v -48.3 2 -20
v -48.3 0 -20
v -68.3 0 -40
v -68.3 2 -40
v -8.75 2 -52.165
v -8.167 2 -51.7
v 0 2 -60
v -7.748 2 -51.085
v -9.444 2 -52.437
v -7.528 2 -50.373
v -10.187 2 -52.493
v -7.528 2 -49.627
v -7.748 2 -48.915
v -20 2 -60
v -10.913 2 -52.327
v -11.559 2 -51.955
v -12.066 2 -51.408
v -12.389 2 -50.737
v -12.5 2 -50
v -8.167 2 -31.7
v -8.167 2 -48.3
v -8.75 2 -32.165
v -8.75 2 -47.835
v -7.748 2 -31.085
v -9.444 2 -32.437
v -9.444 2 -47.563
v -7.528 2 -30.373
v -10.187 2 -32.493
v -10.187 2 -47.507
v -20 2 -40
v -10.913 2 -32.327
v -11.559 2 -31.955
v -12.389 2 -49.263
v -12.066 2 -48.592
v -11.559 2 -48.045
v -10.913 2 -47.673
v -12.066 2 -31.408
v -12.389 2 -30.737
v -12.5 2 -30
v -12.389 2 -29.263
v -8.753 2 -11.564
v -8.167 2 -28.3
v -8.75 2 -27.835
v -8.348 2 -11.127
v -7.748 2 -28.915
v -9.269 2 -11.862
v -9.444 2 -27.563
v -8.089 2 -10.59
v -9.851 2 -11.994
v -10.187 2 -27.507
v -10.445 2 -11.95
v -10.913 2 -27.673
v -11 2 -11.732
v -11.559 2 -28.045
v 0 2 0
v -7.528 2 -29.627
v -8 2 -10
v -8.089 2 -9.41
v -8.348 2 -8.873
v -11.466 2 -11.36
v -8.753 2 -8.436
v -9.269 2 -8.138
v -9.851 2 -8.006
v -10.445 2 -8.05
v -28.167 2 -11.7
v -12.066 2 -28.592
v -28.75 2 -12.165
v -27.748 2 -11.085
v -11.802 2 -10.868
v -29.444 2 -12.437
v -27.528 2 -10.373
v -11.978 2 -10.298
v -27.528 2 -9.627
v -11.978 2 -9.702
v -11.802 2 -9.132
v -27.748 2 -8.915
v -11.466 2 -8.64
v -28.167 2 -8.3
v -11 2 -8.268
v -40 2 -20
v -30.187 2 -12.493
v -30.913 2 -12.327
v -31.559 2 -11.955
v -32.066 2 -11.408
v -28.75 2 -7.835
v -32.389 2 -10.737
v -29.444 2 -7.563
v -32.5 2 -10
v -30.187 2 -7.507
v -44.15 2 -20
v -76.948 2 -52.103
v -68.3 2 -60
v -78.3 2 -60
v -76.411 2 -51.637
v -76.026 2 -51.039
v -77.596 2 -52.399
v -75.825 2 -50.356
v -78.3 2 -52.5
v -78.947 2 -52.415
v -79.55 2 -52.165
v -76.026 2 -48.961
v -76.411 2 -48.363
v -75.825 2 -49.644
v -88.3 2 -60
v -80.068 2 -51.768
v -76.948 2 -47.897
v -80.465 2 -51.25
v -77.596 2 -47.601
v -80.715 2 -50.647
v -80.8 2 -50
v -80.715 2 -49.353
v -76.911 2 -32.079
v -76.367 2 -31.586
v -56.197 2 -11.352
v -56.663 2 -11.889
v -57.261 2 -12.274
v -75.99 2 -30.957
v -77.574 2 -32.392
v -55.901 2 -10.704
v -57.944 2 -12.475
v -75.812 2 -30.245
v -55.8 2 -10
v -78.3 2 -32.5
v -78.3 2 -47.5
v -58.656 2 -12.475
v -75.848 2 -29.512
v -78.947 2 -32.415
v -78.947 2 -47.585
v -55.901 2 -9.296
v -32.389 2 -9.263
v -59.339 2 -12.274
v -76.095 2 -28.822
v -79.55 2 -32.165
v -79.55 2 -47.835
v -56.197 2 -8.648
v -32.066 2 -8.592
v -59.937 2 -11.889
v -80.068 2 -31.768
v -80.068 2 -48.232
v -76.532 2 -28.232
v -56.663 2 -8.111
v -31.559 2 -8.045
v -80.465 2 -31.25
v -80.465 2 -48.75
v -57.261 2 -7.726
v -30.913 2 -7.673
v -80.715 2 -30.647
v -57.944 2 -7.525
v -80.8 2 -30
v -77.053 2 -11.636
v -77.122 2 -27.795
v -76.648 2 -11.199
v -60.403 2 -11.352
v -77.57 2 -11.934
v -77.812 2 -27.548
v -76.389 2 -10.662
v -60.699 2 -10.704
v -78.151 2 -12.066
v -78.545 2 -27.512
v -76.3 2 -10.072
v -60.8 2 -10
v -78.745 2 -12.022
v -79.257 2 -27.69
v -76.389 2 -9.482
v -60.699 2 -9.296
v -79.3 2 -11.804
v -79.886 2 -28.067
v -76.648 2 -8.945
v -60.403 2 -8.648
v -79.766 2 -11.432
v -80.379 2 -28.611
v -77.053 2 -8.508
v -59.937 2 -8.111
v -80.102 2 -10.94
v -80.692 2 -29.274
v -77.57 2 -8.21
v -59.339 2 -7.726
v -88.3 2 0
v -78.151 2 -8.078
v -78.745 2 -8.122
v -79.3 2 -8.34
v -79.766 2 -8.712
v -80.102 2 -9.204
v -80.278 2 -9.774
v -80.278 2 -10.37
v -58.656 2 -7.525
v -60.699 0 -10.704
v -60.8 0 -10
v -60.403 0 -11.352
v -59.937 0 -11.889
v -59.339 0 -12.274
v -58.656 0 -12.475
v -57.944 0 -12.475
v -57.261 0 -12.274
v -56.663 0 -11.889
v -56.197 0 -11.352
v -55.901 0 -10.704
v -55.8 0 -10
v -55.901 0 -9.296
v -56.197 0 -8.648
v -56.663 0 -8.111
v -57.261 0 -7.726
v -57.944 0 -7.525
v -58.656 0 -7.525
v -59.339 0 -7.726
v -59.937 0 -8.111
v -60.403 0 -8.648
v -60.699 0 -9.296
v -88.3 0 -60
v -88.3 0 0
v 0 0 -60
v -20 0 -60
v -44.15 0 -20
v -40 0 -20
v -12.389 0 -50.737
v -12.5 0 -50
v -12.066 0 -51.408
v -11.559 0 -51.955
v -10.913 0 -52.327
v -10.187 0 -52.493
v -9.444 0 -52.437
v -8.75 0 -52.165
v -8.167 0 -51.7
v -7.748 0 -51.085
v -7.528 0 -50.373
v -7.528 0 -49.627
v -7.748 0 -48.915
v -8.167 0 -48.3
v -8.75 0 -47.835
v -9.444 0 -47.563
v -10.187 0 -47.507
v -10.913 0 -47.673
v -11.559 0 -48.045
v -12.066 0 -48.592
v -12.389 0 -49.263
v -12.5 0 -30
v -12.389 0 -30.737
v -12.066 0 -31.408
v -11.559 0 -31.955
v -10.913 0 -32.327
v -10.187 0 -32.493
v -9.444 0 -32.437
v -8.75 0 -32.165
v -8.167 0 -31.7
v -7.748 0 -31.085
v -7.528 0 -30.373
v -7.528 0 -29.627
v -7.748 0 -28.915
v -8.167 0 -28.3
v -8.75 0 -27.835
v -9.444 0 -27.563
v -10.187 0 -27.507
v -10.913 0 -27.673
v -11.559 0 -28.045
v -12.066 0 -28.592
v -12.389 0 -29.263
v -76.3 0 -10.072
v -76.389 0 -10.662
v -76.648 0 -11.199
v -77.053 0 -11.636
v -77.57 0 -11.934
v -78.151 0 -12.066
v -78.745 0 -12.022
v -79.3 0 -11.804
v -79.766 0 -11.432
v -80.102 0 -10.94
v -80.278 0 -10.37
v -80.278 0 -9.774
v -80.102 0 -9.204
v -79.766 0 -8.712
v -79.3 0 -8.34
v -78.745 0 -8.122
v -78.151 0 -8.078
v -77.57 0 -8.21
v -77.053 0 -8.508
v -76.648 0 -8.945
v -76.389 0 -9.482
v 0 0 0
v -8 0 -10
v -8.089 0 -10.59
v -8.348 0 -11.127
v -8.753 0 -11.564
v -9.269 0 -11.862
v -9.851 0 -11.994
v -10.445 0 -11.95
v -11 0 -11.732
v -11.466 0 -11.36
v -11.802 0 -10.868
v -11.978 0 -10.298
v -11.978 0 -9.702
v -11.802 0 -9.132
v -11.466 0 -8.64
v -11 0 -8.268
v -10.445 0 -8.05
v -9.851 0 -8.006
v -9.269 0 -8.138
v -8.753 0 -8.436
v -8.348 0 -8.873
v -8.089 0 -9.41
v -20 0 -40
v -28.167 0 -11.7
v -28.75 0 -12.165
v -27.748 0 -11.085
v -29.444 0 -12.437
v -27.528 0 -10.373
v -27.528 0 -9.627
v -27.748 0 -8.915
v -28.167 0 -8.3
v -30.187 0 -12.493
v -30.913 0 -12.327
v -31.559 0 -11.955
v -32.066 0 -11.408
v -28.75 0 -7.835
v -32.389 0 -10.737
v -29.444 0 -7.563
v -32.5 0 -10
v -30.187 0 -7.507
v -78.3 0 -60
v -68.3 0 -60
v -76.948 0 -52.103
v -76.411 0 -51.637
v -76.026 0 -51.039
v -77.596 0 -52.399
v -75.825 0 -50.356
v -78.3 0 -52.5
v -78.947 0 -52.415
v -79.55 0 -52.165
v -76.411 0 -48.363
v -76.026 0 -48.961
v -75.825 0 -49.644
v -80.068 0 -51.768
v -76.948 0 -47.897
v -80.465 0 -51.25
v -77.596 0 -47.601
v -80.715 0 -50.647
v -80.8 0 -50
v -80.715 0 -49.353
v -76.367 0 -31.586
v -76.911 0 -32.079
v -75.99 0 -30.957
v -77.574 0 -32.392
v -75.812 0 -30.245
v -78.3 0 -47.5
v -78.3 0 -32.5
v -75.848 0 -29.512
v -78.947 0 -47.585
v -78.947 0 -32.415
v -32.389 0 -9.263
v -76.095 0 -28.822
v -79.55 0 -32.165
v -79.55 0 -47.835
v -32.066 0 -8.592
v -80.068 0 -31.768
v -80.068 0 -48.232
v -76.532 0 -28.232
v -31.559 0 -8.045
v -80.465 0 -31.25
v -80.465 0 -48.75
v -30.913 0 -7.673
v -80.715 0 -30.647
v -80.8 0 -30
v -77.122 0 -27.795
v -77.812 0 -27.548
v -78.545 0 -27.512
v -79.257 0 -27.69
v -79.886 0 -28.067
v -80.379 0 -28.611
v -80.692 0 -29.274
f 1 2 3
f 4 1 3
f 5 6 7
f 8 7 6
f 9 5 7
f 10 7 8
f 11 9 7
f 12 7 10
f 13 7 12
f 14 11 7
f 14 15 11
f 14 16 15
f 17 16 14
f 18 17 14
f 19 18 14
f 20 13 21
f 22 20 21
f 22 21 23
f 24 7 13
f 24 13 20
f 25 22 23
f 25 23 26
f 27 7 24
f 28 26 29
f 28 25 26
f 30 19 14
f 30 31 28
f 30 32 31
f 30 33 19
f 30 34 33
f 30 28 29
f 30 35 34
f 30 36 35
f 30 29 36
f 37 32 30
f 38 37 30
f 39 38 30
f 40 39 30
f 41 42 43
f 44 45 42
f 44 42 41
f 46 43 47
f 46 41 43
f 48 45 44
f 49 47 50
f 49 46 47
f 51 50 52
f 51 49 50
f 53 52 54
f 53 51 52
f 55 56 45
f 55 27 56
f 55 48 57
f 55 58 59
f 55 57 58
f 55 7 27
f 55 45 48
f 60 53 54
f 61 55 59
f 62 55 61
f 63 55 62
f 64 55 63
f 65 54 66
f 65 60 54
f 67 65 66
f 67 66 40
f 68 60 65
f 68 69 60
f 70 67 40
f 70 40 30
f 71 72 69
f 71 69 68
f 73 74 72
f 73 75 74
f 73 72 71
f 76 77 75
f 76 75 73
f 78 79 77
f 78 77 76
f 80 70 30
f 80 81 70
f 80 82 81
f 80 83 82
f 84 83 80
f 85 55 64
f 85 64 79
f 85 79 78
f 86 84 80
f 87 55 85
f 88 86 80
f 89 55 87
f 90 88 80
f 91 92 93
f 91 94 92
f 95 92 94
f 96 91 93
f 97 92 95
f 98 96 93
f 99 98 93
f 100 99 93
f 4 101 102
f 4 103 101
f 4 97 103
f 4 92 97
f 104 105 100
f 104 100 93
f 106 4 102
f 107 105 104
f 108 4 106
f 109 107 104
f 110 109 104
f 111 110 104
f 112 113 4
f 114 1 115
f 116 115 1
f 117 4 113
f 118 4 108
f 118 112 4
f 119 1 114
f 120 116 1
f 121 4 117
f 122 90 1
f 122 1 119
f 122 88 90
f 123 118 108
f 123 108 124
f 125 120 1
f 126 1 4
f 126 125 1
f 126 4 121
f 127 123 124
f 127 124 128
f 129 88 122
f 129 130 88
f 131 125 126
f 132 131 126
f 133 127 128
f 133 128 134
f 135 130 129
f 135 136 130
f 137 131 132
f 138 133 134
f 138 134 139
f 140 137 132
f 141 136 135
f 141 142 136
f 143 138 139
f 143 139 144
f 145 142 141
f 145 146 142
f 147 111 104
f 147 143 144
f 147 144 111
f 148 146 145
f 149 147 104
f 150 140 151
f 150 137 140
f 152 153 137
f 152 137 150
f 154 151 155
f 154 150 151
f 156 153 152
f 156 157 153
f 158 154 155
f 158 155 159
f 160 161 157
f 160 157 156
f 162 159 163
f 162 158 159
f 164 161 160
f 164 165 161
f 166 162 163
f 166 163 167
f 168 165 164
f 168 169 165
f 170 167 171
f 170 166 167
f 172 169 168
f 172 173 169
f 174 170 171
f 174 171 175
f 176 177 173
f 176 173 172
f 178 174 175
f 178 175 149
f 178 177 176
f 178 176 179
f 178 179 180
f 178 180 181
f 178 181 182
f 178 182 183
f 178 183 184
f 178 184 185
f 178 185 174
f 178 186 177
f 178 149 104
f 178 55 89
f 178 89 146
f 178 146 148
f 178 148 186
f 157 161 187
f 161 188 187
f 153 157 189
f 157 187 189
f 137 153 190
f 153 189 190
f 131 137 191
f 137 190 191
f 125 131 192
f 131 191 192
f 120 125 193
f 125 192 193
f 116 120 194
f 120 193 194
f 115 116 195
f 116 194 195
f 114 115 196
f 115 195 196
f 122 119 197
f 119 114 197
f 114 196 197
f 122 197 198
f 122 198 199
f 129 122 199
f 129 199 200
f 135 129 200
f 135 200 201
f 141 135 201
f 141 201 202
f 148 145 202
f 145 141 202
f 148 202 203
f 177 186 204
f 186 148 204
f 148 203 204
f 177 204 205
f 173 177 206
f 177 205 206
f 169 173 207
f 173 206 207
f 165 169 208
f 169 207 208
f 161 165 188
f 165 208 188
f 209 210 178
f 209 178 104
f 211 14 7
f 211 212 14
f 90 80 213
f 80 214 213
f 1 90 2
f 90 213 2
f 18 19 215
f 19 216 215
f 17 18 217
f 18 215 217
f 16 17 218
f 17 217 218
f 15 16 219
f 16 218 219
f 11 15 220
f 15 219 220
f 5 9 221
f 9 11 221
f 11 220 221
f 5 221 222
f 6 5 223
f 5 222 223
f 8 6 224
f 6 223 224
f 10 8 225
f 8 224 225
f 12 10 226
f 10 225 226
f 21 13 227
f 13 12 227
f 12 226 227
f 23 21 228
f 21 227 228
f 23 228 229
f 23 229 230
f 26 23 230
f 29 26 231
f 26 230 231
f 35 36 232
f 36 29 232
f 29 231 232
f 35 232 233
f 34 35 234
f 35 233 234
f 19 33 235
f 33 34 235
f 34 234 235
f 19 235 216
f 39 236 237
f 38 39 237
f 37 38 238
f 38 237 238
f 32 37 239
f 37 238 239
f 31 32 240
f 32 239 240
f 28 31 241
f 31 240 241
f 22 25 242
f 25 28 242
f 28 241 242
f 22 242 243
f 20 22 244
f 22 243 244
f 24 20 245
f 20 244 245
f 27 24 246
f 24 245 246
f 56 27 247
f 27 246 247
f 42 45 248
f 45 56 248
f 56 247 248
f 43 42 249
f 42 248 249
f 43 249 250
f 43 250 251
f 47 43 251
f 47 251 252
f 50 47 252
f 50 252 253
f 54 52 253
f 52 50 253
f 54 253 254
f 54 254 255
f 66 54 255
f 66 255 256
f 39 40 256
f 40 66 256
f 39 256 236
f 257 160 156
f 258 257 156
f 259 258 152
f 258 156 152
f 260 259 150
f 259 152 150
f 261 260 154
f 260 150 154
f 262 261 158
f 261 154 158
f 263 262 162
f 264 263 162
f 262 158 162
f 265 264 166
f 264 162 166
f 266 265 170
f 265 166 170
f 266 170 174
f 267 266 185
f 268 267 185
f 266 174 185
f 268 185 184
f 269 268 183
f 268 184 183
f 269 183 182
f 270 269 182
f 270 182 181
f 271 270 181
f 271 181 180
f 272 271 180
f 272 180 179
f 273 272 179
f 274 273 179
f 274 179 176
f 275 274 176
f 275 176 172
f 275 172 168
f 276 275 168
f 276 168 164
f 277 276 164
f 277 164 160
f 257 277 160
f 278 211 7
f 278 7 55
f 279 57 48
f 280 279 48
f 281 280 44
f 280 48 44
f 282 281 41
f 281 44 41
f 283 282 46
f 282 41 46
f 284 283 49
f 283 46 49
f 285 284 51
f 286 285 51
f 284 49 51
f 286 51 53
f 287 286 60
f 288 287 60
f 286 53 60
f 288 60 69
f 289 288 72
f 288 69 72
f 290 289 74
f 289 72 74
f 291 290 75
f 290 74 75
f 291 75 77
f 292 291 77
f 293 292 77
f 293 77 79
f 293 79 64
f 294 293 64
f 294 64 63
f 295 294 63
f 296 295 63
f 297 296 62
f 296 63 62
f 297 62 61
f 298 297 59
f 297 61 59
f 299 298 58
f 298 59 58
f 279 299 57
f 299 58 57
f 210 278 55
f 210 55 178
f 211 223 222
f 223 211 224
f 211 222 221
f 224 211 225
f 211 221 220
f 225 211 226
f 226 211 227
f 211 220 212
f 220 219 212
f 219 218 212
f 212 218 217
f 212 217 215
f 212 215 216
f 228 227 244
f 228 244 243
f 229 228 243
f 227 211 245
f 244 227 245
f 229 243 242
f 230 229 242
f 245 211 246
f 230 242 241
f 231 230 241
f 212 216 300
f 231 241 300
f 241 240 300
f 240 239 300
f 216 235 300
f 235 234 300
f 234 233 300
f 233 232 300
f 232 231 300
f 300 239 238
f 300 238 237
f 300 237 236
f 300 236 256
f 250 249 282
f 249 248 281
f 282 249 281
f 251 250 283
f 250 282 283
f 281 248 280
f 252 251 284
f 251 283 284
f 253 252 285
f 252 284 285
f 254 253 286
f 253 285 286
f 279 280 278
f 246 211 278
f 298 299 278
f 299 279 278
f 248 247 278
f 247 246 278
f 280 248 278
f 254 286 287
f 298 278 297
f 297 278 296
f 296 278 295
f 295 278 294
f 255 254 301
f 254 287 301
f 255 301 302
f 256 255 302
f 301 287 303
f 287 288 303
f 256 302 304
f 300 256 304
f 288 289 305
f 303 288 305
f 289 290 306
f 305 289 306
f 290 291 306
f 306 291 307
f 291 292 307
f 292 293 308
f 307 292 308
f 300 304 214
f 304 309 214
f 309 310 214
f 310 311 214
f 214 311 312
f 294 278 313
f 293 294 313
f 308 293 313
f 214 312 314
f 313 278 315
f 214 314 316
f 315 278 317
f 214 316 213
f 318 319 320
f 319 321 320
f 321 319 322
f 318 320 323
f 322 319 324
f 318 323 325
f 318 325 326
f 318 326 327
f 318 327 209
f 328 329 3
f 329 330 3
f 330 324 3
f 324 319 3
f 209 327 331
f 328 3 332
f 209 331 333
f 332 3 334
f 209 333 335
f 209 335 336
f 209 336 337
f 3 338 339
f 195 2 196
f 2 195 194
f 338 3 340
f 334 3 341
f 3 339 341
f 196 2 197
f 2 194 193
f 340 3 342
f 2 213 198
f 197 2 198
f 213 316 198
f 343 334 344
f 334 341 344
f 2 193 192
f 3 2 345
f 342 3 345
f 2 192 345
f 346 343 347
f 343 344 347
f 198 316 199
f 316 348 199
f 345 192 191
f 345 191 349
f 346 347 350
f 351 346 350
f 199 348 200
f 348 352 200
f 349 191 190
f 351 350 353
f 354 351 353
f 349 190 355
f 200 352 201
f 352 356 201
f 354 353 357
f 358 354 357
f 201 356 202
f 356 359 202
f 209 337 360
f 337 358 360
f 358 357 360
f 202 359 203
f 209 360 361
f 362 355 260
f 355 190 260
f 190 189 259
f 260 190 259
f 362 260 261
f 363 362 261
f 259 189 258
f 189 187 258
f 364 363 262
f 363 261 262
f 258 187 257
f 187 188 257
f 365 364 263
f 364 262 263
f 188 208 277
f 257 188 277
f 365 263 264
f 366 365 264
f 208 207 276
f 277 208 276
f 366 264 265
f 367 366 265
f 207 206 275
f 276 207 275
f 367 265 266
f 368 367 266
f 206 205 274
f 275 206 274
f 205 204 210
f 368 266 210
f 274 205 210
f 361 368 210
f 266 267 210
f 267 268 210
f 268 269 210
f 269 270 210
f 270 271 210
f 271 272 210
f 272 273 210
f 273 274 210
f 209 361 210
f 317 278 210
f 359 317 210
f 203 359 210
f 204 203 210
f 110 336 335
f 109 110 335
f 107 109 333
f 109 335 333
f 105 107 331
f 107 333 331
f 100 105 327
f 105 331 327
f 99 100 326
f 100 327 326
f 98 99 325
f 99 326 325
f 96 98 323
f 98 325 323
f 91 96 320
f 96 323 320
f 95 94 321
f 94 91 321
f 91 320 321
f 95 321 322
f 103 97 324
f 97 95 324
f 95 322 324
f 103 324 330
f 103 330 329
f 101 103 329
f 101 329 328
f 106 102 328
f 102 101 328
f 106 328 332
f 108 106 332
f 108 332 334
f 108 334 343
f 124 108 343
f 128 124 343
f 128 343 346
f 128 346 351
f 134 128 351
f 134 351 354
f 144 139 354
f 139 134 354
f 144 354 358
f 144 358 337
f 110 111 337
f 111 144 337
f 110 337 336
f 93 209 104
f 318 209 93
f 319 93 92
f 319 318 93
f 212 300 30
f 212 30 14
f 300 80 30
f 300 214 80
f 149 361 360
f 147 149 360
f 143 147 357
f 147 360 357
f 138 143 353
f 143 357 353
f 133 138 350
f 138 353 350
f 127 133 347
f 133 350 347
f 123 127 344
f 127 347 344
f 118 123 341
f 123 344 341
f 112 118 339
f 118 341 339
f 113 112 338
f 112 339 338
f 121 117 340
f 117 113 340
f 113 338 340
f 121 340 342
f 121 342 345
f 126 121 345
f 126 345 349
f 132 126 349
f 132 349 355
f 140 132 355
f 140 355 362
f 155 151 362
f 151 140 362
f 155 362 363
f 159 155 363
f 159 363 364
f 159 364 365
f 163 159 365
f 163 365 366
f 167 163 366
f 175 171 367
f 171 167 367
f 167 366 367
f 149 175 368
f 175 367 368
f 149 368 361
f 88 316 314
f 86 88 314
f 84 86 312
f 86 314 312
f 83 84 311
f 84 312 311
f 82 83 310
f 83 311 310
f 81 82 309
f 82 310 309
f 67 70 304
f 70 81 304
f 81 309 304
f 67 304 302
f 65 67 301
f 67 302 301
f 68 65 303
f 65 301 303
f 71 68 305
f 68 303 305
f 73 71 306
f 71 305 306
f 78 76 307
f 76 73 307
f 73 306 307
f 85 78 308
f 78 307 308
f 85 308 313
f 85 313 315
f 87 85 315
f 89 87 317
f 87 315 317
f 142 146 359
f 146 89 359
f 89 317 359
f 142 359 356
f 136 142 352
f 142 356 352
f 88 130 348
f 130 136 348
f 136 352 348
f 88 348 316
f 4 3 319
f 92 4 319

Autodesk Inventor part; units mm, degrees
ref_plane "YZ Plane" through (0, 0, 0) normal (1, 0, 0) x (0, 1, 0)
ref_plane "XZ Plane" through (0, 0, 0) normal (0, 1, 0) x (-1, 0, 0)
ref_plane "XY Plane" through (0, 0, 0) normal (0, 0, 1) x (1, 0, 0)
sketch "Sketch2" plane through (0, 0, 0) normal (0, 1, 0) x (-1, 0, 0)
  line L0 (0, 0) -> (88.3, 0)
  line L1 (88.3, 0) -> (88.3, -60)
  line L2 (88.3, -60) -> (0, -60)
  line L3 (0, -60) -> (0, 0)
  line L4 (88.3, -60) -> (68.3, -60)
  line L5 (68.3, 0) -> (68.3, -20)
  line L6 (0, -60) -> (20, -60)
  line L7 (20, 0) -> (20, -20)
  line L8 (20, -20) -> (20, -60)
  line L9 (20, -20) -> (68.3, -20)
  line L10 (68.3, -20) -> (68.3, -60)
  line L11 (68.3, -20) -> (48.3, -20)
  line L12 (48.3, -20) -> (68.3, -40)
  line L13 (20, -20) -> (40, -20)
  line L14 (40, -20) -> (20, -40)
  line L15 (78.3, -60) -> (78.3, -40)
  line L16 (78.3, -40) -> (78.3, -50)
  line L17 (78.3, -40) -> (78.3, -50)
  line L18 (78.3, -40) -> (78.3, -30)
  circle A0 centre (78.3, -30) radius 2.5
  circle A1 centre (78.3, -50) radius 2.5
  line L19 (44.15, -60) -> (44.15, -44.15)
  circle A2 centre (10, -30) radius 2.5
  circle A3 centre (10, -50) radius 2.5
  line L20 (44.15, -20) -> (44.15, -10)
  line L21 (44.15, -10) -> (58.3, -10)
  line L22 (44.15, -10) -> (30, -10)
  circle A4 centre (58.3, -10) radius 2.5
  circle A5 centre (30, -10) radius 2.5
  dimension "d0" = 88.3
  dimension "d1" = 60
  dimension "d2" = 20
  dimension "d3" = 20
  dimension "d4" = 20
  dimension "d5" = 20
  dimension "d6" = 20
  dimension "d7" = 20
  dimension "d9" = 20
  dimension "d10" = 5
  dimension "d11" = 5
  dimension "d12" = 5
  dimension "d13" = 5
extrude "Extrusion1" add sketch "Sketch2" along normal blind 2 contours L0 L7 L8 L2 L3 | L0 L5 L9 L7 | L0 L1 L2 L10 L5 | L9 L14 L8 | L10 L12 L9
sketch "Sketch3" plane through (0, 2, 0) normal (0, 1, 0) x (1, 0, 0)
  line L0 (0, 0) -> (0, 10)
  line L1 (0, 0) -> (0, 60) projected
  line L2 (0, 10) -> (-10, 10)
  line L3 (-88.2278, 0) -> (-88.3, 9.9997)
  line L4 (-88.3, 60) -> (-88.3, 0) projected
  line L5 (-88.3, 9.9997) -> (-78.3003, 10.072)
  circle A0 centre (-78.3003, 10.072) radius 2
  circle A1 centre (-10, 10) radius 2
  dimension "d16" = 10
  dimension "d17" = 10
  dimension "d18" = 10
  dimension "d19" = 10
  dimension "d20" = 4
  dimension "d21" = 4
extrude "Extrusion2" cut sketch "Sketch3" against normal blind 2
properties part number "Connect_u2020" material "Aluminum 6061"
